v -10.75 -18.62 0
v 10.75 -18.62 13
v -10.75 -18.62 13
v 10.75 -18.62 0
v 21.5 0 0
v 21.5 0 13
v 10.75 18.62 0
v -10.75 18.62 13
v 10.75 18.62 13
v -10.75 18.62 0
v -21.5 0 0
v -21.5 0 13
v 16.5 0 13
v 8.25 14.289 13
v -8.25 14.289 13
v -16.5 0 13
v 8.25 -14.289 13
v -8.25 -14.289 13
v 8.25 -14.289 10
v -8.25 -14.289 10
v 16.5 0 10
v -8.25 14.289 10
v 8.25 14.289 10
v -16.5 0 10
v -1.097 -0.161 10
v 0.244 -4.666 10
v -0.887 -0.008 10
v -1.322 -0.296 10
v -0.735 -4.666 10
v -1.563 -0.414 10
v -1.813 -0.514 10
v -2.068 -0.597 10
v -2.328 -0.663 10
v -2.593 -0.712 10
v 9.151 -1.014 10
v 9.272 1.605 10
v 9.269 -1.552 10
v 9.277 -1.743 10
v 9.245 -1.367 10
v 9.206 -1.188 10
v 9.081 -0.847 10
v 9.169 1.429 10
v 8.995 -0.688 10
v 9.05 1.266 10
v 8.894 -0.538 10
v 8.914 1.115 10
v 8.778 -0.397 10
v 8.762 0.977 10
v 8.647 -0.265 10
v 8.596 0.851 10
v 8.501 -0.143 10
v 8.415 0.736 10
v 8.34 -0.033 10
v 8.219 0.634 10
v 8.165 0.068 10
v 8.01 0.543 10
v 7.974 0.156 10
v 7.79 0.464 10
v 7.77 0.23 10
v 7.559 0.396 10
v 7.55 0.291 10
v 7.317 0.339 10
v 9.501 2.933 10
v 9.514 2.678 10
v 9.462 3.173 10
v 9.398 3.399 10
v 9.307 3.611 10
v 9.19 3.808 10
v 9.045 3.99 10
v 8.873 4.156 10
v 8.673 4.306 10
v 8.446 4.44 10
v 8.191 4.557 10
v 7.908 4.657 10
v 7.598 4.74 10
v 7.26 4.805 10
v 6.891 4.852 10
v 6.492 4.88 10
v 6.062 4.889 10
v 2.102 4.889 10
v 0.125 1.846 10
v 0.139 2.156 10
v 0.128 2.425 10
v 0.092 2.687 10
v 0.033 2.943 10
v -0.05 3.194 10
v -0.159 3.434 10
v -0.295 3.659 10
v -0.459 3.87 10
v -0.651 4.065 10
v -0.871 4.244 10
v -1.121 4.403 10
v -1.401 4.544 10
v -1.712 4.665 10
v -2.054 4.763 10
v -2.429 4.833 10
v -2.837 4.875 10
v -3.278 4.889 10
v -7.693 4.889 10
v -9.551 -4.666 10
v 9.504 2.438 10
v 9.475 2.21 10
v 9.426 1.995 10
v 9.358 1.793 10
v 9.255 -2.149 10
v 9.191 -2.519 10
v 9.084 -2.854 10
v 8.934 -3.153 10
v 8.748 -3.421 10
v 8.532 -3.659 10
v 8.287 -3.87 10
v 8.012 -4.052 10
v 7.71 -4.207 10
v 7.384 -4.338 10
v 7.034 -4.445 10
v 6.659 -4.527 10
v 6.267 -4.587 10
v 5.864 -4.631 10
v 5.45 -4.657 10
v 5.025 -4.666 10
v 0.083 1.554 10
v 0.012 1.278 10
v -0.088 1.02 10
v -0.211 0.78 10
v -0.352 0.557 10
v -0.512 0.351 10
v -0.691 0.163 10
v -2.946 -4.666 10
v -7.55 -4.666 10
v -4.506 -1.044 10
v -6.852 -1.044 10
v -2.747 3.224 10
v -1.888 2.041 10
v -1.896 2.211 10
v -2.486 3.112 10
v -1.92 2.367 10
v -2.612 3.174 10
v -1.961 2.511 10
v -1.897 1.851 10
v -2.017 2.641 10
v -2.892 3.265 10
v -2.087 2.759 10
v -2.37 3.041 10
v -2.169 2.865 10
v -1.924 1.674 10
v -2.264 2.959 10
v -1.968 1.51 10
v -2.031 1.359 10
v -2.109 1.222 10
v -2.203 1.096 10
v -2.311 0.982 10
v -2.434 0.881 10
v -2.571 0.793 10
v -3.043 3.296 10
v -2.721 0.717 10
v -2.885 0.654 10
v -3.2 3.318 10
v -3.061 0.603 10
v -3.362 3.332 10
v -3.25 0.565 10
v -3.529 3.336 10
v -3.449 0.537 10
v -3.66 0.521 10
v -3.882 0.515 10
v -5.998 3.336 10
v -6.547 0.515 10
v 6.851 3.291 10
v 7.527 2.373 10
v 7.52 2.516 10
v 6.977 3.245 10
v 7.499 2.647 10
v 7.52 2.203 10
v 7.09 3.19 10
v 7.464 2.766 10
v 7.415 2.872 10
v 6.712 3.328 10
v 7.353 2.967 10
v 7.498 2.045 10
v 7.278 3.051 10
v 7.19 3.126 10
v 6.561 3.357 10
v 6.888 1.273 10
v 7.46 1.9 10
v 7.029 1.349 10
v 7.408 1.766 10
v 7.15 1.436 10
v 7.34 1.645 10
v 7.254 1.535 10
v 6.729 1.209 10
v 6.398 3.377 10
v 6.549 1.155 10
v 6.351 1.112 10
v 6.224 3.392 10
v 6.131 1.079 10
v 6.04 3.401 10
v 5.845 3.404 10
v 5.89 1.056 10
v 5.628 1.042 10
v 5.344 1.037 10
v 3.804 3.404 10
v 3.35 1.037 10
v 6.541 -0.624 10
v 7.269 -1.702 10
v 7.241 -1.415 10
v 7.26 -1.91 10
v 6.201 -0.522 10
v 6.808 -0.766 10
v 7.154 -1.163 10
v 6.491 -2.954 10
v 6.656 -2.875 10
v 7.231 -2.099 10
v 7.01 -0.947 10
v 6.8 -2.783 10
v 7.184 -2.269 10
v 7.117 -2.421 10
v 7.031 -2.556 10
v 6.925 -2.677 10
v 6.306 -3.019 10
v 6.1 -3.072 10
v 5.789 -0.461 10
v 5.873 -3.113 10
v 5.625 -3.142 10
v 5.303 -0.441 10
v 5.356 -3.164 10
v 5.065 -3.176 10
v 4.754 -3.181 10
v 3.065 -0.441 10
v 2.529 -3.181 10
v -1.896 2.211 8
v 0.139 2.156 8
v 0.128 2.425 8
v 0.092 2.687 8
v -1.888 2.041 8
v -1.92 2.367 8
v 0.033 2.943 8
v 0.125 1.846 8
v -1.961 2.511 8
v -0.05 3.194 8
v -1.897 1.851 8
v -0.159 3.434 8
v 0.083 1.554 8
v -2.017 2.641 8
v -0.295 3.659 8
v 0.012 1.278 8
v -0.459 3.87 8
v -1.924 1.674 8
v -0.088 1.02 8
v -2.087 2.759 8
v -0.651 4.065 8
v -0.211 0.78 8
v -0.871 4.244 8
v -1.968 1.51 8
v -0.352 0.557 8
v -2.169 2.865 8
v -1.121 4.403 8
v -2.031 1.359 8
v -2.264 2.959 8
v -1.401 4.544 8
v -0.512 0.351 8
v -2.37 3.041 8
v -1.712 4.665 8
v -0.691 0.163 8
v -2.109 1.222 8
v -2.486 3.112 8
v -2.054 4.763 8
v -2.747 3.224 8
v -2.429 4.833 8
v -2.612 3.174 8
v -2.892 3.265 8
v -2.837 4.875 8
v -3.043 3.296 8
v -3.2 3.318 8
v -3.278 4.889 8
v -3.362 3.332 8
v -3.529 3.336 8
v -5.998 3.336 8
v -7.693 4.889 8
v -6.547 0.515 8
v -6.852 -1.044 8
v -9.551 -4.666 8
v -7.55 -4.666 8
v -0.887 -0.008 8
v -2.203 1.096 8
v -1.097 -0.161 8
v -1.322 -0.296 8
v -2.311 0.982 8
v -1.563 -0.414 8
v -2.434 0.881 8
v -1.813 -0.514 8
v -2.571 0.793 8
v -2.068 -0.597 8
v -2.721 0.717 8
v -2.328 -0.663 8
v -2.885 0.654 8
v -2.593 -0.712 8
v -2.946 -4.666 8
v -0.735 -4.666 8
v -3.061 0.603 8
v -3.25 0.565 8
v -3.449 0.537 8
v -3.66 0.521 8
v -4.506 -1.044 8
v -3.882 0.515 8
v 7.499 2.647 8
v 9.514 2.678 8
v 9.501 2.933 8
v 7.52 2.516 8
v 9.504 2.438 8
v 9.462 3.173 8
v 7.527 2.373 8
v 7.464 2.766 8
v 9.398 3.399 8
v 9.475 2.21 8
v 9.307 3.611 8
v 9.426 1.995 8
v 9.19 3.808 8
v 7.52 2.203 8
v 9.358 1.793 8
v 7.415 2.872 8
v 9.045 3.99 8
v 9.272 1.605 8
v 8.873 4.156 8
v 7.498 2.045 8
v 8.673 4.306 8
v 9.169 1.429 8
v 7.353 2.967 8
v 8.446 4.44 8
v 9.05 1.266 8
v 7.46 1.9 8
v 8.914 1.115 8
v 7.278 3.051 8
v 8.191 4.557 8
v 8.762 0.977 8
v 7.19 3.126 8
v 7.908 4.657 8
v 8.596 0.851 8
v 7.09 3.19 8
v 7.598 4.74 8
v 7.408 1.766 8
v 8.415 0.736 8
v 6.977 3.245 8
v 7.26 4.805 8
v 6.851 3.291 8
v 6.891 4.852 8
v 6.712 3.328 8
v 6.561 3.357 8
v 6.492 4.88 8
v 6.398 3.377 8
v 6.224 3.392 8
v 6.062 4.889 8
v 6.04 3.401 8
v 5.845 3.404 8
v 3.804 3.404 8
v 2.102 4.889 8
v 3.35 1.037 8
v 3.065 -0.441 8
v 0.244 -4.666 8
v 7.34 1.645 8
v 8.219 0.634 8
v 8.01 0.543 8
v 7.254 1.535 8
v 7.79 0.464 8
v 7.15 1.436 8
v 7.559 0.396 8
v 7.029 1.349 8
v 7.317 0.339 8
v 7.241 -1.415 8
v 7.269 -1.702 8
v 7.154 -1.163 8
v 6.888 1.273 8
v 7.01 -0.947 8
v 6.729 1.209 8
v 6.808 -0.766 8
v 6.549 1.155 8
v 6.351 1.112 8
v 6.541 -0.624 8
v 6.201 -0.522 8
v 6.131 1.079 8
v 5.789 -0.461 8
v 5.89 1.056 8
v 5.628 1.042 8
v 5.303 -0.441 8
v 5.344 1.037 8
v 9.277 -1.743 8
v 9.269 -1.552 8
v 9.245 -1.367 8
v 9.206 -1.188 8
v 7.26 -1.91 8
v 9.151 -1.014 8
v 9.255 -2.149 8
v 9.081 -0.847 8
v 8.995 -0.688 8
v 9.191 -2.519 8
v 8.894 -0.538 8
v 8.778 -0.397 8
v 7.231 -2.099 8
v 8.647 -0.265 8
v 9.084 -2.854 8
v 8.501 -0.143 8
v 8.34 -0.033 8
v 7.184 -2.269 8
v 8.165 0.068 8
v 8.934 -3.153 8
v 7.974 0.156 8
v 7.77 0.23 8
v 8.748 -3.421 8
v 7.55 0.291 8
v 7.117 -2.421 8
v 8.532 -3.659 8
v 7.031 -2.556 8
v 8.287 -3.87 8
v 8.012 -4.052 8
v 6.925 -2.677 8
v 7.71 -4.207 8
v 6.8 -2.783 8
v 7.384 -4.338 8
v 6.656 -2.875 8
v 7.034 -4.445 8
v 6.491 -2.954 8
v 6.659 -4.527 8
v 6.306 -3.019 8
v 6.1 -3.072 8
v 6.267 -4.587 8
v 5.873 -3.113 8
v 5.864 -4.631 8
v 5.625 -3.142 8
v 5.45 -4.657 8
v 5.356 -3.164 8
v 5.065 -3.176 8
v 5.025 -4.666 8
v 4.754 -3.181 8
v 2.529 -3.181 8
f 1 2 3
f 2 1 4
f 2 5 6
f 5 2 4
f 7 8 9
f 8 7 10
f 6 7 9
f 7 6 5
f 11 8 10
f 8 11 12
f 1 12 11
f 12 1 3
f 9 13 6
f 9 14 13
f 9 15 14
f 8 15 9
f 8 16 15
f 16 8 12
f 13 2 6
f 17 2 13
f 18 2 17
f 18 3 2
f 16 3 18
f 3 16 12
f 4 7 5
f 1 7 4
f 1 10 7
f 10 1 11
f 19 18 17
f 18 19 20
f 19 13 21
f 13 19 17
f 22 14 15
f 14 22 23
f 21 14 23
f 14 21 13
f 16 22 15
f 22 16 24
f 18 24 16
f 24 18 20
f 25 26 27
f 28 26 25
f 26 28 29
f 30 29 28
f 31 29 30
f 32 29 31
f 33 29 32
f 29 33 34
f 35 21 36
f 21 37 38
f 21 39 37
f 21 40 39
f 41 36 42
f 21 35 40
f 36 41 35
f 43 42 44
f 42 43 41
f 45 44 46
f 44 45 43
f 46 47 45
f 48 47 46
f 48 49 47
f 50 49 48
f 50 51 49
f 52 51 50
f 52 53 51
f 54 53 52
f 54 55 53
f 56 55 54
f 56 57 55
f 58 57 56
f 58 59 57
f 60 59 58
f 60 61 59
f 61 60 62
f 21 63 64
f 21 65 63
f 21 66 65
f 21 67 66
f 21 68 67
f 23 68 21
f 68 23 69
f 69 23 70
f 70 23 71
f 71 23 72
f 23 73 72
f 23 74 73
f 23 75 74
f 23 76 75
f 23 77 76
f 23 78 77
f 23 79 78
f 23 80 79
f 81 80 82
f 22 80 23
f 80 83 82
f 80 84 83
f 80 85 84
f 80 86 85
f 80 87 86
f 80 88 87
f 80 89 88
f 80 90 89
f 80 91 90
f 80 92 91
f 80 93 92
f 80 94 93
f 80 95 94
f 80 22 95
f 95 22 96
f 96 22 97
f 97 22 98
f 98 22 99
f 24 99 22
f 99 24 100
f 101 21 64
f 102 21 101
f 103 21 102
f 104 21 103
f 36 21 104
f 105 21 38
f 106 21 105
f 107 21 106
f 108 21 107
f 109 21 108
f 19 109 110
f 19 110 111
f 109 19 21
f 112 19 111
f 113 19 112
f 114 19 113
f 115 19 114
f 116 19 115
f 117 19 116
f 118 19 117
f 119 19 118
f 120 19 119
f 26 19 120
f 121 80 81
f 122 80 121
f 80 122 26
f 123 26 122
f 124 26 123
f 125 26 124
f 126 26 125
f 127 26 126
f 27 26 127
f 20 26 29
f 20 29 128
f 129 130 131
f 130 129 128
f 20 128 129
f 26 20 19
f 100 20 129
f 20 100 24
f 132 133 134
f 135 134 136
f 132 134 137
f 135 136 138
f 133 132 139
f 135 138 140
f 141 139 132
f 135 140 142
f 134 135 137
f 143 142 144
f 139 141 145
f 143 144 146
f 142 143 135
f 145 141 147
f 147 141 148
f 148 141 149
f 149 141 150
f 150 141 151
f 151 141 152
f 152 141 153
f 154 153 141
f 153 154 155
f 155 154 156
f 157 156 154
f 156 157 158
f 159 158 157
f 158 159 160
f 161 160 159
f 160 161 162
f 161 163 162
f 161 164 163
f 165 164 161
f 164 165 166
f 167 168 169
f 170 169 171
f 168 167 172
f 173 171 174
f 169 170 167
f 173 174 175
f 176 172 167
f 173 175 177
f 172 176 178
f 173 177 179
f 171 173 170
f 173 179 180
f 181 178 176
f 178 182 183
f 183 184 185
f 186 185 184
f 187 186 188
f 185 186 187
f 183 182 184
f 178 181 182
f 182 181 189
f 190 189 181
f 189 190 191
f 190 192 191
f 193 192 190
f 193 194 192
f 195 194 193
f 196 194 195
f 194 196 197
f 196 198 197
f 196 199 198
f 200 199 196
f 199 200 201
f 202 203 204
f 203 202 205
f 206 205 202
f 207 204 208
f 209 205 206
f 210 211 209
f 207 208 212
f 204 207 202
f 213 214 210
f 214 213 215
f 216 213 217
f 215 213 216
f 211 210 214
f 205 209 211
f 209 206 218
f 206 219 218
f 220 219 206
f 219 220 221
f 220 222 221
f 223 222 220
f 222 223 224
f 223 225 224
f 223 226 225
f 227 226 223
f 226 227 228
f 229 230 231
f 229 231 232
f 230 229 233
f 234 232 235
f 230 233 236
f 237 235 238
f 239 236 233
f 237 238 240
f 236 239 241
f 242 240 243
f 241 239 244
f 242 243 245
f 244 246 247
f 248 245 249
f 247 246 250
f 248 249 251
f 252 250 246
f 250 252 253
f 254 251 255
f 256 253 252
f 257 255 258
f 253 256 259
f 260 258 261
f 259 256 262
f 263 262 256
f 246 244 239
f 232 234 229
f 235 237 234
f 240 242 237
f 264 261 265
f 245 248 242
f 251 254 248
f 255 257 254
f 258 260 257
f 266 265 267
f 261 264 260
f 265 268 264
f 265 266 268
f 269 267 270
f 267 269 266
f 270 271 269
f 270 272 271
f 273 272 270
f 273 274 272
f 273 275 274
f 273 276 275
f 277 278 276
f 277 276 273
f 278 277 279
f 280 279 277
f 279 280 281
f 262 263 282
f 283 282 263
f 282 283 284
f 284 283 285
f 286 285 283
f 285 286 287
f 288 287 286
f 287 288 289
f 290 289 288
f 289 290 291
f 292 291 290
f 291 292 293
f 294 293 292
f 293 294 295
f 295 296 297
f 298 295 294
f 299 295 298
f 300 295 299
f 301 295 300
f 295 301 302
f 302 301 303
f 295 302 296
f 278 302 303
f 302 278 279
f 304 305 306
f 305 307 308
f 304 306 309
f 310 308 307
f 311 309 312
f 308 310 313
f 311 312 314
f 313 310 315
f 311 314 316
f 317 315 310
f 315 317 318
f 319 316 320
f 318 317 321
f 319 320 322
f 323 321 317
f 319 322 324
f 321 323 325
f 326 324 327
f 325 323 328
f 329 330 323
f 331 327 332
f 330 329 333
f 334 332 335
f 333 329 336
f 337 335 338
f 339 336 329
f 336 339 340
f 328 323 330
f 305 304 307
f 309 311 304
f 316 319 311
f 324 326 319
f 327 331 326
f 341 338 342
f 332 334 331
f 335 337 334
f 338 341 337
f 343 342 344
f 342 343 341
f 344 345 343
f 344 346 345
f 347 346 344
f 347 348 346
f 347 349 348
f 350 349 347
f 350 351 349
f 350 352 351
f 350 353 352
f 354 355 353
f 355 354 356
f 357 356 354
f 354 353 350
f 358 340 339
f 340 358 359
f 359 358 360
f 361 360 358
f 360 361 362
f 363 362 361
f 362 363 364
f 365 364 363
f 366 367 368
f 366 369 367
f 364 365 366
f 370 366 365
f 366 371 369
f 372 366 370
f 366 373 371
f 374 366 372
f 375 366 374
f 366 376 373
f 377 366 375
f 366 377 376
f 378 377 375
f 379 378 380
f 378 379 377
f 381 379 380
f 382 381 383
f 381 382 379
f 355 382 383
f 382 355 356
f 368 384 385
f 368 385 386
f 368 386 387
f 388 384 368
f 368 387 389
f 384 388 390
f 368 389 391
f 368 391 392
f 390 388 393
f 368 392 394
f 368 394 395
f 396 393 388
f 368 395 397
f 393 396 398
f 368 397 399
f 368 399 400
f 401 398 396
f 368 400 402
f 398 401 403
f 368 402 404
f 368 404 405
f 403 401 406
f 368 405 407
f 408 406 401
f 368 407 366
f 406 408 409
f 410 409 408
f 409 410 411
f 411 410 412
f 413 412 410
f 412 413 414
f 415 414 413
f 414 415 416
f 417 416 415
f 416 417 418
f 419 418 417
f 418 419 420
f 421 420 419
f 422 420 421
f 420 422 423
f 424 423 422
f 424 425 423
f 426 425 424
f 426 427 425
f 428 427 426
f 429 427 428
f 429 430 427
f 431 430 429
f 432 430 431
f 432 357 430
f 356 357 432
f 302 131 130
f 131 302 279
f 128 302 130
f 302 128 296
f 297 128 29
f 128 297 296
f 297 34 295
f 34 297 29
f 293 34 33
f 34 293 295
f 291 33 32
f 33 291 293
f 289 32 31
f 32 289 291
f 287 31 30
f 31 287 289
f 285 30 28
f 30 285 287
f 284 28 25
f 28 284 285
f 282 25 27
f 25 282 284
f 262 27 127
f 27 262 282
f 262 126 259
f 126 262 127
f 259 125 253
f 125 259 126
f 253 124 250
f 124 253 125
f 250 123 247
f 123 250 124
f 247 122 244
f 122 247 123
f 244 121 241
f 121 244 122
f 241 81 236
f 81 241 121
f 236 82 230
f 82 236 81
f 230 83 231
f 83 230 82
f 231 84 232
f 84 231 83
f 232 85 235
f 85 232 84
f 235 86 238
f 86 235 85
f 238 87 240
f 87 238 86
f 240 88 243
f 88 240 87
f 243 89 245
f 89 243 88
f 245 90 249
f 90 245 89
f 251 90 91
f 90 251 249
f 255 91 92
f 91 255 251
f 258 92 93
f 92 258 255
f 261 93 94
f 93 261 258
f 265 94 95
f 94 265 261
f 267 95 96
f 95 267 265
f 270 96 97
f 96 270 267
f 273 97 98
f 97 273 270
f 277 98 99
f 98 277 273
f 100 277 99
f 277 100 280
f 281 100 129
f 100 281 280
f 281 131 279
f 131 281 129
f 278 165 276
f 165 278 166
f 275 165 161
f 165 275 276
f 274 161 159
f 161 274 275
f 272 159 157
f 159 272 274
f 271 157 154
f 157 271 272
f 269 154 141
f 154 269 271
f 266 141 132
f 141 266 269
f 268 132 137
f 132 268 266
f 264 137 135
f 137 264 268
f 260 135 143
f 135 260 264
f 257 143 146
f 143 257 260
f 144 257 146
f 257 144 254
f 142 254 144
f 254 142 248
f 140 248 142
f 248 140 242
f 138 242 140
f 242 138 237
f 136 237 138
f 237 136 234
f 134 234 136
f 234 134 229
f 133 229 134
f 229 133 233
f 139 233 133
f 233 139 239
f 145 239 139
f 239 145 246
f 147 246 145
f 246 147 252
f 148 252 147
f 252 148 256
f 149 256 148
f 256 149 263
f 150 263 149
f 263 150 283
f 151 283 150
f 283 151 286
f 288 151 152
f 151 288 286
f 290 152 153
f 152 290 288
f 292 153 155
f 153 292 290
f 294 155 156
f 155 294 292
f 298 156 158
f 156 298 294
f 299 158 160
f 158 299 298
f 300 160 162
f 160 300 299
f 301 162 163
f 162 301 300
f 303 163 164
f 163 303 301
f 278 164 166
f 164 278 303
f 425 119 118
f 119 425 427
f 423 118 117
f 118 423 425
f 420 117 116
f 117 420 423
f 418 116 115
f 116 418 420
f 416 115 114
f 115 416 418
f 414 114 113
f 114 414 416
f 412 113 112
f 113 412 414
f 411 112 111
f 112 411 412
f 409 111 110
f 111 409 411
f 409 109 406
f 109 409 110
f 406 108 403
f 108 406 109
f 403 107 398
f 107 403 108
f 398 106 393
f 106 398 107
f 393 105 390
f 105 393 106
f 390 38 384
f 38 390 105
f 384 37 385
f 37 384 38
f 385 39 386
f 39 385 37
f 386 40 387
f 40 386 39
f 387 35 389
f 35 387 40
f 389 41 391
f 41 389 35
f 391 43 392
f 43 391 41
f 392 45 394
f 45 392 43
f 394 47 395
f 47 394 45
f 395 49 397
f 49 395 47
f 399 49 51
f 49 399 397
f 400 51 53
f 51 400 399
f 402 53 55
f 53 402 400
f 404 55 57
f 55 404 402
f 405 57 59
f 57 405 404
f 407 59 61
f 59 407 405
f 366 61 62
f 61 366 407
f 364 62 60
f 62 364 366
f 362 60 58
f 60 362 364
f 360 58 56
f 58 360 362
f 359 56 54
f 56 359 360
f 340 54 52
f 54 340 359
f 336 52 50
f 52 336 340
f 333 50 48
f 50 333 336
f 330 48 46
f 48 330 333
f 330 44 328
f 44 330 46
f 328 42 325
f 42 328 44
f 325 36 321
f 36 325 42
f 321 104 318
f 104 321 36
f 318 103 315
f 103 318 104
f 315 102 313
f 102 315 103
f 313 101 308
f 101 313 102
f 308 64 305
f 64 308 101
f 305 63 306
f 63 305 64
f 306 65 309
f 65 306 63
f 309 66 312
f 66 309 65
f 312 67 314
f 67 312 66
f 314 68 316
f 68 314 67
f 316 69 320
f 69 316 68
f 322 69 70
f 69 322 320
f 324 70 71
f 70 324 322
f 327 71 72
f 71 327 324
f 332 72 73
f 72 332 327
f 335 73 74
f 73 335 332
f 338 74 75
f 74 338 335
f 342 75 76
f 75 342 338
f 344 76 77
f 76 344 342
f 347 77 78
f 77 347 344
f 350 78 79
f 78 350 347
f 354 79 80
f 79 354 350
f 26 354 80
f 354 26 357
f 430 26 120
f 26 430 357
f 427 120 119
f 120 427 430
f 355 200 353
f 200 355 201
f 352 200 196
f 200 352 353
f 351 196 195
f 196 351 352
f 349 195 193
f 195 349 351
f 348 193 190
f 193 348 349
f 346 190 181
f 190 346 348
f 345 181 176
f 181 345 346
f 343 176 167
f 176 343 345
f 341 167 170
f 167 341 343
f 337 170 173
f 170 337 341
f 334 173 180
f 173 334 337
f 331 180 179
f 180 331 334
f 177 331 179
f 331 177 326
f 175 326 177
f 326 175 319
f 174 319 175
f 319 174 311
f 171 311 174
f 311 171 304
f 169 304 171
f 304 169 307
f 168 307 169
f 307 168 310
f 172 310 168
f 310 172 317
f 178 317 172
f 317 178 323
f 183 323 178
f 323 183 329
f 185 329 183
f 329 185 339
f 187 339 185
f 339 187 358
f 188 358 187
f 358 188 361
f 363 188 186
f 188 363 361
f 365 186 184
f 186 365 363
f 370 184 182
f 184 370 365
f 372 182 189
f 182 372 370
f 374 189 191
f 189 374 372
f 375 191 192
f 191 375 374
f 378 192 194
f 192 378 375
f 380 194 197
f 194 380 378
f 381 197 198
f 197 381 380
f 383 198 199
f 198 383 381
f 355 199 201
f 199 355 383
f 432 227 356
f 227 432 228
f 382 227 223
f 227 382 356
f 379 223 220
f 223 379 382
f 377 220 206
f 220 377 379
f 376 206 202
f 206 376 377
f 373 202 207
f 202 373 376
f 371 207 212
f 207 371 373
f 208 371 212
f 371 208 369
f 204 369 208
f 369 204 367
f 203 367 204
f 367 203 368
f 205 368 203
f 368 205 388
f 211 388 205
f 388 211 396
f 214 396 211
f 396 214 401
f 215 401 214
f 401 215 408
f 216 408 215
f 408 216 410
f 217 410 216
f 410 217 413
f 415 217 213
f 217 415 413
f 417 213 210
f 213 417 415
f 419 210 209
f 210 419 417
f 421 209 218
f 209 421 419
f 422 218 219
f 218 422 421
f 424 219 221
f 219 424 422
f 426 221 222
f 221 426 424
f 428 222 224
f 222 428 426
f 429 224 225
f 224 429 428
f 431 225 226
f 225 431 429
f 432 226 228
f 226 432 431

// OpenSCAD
DEBUG = true;
DEBUG = false;

inner_radius = 16.5;
rim_thickness = 5;
rim_height = 3;
outer_radius = inner_radius + rim_thickness;
n_sides = 6;
standoff_height = 10;
height = standoff_height + rim_height;

module body() {
    difference(){
        // Main body
        cylinder(r=outer_radius, h=height, $fn=n_sides);

        // Inner recess
        translate([0,0, standoff_height])
        cylinder(r=inner_radius, h=(rim_height + 1), $fn=n_sides);
    }
}

module chop_top() {
    difference() {
        body();
        translate([-50,-50,-92]) cube(100);
    }
}


module main(chop=false) {
    difference() {
        if (chop) {
            chop_top();
        } else {
            body();
        }

        text_depth = 2;
        text_font = "helvetica";
        text_font = "Liberation Sans:style=Bold Italic";
        translate([0, 0, standoff_height - text_depth])
            linear_extrude(text_depth)
            text("RB", font=text_font, halign="center", valign="center");
    }
}

main(chop=DEBUG);
